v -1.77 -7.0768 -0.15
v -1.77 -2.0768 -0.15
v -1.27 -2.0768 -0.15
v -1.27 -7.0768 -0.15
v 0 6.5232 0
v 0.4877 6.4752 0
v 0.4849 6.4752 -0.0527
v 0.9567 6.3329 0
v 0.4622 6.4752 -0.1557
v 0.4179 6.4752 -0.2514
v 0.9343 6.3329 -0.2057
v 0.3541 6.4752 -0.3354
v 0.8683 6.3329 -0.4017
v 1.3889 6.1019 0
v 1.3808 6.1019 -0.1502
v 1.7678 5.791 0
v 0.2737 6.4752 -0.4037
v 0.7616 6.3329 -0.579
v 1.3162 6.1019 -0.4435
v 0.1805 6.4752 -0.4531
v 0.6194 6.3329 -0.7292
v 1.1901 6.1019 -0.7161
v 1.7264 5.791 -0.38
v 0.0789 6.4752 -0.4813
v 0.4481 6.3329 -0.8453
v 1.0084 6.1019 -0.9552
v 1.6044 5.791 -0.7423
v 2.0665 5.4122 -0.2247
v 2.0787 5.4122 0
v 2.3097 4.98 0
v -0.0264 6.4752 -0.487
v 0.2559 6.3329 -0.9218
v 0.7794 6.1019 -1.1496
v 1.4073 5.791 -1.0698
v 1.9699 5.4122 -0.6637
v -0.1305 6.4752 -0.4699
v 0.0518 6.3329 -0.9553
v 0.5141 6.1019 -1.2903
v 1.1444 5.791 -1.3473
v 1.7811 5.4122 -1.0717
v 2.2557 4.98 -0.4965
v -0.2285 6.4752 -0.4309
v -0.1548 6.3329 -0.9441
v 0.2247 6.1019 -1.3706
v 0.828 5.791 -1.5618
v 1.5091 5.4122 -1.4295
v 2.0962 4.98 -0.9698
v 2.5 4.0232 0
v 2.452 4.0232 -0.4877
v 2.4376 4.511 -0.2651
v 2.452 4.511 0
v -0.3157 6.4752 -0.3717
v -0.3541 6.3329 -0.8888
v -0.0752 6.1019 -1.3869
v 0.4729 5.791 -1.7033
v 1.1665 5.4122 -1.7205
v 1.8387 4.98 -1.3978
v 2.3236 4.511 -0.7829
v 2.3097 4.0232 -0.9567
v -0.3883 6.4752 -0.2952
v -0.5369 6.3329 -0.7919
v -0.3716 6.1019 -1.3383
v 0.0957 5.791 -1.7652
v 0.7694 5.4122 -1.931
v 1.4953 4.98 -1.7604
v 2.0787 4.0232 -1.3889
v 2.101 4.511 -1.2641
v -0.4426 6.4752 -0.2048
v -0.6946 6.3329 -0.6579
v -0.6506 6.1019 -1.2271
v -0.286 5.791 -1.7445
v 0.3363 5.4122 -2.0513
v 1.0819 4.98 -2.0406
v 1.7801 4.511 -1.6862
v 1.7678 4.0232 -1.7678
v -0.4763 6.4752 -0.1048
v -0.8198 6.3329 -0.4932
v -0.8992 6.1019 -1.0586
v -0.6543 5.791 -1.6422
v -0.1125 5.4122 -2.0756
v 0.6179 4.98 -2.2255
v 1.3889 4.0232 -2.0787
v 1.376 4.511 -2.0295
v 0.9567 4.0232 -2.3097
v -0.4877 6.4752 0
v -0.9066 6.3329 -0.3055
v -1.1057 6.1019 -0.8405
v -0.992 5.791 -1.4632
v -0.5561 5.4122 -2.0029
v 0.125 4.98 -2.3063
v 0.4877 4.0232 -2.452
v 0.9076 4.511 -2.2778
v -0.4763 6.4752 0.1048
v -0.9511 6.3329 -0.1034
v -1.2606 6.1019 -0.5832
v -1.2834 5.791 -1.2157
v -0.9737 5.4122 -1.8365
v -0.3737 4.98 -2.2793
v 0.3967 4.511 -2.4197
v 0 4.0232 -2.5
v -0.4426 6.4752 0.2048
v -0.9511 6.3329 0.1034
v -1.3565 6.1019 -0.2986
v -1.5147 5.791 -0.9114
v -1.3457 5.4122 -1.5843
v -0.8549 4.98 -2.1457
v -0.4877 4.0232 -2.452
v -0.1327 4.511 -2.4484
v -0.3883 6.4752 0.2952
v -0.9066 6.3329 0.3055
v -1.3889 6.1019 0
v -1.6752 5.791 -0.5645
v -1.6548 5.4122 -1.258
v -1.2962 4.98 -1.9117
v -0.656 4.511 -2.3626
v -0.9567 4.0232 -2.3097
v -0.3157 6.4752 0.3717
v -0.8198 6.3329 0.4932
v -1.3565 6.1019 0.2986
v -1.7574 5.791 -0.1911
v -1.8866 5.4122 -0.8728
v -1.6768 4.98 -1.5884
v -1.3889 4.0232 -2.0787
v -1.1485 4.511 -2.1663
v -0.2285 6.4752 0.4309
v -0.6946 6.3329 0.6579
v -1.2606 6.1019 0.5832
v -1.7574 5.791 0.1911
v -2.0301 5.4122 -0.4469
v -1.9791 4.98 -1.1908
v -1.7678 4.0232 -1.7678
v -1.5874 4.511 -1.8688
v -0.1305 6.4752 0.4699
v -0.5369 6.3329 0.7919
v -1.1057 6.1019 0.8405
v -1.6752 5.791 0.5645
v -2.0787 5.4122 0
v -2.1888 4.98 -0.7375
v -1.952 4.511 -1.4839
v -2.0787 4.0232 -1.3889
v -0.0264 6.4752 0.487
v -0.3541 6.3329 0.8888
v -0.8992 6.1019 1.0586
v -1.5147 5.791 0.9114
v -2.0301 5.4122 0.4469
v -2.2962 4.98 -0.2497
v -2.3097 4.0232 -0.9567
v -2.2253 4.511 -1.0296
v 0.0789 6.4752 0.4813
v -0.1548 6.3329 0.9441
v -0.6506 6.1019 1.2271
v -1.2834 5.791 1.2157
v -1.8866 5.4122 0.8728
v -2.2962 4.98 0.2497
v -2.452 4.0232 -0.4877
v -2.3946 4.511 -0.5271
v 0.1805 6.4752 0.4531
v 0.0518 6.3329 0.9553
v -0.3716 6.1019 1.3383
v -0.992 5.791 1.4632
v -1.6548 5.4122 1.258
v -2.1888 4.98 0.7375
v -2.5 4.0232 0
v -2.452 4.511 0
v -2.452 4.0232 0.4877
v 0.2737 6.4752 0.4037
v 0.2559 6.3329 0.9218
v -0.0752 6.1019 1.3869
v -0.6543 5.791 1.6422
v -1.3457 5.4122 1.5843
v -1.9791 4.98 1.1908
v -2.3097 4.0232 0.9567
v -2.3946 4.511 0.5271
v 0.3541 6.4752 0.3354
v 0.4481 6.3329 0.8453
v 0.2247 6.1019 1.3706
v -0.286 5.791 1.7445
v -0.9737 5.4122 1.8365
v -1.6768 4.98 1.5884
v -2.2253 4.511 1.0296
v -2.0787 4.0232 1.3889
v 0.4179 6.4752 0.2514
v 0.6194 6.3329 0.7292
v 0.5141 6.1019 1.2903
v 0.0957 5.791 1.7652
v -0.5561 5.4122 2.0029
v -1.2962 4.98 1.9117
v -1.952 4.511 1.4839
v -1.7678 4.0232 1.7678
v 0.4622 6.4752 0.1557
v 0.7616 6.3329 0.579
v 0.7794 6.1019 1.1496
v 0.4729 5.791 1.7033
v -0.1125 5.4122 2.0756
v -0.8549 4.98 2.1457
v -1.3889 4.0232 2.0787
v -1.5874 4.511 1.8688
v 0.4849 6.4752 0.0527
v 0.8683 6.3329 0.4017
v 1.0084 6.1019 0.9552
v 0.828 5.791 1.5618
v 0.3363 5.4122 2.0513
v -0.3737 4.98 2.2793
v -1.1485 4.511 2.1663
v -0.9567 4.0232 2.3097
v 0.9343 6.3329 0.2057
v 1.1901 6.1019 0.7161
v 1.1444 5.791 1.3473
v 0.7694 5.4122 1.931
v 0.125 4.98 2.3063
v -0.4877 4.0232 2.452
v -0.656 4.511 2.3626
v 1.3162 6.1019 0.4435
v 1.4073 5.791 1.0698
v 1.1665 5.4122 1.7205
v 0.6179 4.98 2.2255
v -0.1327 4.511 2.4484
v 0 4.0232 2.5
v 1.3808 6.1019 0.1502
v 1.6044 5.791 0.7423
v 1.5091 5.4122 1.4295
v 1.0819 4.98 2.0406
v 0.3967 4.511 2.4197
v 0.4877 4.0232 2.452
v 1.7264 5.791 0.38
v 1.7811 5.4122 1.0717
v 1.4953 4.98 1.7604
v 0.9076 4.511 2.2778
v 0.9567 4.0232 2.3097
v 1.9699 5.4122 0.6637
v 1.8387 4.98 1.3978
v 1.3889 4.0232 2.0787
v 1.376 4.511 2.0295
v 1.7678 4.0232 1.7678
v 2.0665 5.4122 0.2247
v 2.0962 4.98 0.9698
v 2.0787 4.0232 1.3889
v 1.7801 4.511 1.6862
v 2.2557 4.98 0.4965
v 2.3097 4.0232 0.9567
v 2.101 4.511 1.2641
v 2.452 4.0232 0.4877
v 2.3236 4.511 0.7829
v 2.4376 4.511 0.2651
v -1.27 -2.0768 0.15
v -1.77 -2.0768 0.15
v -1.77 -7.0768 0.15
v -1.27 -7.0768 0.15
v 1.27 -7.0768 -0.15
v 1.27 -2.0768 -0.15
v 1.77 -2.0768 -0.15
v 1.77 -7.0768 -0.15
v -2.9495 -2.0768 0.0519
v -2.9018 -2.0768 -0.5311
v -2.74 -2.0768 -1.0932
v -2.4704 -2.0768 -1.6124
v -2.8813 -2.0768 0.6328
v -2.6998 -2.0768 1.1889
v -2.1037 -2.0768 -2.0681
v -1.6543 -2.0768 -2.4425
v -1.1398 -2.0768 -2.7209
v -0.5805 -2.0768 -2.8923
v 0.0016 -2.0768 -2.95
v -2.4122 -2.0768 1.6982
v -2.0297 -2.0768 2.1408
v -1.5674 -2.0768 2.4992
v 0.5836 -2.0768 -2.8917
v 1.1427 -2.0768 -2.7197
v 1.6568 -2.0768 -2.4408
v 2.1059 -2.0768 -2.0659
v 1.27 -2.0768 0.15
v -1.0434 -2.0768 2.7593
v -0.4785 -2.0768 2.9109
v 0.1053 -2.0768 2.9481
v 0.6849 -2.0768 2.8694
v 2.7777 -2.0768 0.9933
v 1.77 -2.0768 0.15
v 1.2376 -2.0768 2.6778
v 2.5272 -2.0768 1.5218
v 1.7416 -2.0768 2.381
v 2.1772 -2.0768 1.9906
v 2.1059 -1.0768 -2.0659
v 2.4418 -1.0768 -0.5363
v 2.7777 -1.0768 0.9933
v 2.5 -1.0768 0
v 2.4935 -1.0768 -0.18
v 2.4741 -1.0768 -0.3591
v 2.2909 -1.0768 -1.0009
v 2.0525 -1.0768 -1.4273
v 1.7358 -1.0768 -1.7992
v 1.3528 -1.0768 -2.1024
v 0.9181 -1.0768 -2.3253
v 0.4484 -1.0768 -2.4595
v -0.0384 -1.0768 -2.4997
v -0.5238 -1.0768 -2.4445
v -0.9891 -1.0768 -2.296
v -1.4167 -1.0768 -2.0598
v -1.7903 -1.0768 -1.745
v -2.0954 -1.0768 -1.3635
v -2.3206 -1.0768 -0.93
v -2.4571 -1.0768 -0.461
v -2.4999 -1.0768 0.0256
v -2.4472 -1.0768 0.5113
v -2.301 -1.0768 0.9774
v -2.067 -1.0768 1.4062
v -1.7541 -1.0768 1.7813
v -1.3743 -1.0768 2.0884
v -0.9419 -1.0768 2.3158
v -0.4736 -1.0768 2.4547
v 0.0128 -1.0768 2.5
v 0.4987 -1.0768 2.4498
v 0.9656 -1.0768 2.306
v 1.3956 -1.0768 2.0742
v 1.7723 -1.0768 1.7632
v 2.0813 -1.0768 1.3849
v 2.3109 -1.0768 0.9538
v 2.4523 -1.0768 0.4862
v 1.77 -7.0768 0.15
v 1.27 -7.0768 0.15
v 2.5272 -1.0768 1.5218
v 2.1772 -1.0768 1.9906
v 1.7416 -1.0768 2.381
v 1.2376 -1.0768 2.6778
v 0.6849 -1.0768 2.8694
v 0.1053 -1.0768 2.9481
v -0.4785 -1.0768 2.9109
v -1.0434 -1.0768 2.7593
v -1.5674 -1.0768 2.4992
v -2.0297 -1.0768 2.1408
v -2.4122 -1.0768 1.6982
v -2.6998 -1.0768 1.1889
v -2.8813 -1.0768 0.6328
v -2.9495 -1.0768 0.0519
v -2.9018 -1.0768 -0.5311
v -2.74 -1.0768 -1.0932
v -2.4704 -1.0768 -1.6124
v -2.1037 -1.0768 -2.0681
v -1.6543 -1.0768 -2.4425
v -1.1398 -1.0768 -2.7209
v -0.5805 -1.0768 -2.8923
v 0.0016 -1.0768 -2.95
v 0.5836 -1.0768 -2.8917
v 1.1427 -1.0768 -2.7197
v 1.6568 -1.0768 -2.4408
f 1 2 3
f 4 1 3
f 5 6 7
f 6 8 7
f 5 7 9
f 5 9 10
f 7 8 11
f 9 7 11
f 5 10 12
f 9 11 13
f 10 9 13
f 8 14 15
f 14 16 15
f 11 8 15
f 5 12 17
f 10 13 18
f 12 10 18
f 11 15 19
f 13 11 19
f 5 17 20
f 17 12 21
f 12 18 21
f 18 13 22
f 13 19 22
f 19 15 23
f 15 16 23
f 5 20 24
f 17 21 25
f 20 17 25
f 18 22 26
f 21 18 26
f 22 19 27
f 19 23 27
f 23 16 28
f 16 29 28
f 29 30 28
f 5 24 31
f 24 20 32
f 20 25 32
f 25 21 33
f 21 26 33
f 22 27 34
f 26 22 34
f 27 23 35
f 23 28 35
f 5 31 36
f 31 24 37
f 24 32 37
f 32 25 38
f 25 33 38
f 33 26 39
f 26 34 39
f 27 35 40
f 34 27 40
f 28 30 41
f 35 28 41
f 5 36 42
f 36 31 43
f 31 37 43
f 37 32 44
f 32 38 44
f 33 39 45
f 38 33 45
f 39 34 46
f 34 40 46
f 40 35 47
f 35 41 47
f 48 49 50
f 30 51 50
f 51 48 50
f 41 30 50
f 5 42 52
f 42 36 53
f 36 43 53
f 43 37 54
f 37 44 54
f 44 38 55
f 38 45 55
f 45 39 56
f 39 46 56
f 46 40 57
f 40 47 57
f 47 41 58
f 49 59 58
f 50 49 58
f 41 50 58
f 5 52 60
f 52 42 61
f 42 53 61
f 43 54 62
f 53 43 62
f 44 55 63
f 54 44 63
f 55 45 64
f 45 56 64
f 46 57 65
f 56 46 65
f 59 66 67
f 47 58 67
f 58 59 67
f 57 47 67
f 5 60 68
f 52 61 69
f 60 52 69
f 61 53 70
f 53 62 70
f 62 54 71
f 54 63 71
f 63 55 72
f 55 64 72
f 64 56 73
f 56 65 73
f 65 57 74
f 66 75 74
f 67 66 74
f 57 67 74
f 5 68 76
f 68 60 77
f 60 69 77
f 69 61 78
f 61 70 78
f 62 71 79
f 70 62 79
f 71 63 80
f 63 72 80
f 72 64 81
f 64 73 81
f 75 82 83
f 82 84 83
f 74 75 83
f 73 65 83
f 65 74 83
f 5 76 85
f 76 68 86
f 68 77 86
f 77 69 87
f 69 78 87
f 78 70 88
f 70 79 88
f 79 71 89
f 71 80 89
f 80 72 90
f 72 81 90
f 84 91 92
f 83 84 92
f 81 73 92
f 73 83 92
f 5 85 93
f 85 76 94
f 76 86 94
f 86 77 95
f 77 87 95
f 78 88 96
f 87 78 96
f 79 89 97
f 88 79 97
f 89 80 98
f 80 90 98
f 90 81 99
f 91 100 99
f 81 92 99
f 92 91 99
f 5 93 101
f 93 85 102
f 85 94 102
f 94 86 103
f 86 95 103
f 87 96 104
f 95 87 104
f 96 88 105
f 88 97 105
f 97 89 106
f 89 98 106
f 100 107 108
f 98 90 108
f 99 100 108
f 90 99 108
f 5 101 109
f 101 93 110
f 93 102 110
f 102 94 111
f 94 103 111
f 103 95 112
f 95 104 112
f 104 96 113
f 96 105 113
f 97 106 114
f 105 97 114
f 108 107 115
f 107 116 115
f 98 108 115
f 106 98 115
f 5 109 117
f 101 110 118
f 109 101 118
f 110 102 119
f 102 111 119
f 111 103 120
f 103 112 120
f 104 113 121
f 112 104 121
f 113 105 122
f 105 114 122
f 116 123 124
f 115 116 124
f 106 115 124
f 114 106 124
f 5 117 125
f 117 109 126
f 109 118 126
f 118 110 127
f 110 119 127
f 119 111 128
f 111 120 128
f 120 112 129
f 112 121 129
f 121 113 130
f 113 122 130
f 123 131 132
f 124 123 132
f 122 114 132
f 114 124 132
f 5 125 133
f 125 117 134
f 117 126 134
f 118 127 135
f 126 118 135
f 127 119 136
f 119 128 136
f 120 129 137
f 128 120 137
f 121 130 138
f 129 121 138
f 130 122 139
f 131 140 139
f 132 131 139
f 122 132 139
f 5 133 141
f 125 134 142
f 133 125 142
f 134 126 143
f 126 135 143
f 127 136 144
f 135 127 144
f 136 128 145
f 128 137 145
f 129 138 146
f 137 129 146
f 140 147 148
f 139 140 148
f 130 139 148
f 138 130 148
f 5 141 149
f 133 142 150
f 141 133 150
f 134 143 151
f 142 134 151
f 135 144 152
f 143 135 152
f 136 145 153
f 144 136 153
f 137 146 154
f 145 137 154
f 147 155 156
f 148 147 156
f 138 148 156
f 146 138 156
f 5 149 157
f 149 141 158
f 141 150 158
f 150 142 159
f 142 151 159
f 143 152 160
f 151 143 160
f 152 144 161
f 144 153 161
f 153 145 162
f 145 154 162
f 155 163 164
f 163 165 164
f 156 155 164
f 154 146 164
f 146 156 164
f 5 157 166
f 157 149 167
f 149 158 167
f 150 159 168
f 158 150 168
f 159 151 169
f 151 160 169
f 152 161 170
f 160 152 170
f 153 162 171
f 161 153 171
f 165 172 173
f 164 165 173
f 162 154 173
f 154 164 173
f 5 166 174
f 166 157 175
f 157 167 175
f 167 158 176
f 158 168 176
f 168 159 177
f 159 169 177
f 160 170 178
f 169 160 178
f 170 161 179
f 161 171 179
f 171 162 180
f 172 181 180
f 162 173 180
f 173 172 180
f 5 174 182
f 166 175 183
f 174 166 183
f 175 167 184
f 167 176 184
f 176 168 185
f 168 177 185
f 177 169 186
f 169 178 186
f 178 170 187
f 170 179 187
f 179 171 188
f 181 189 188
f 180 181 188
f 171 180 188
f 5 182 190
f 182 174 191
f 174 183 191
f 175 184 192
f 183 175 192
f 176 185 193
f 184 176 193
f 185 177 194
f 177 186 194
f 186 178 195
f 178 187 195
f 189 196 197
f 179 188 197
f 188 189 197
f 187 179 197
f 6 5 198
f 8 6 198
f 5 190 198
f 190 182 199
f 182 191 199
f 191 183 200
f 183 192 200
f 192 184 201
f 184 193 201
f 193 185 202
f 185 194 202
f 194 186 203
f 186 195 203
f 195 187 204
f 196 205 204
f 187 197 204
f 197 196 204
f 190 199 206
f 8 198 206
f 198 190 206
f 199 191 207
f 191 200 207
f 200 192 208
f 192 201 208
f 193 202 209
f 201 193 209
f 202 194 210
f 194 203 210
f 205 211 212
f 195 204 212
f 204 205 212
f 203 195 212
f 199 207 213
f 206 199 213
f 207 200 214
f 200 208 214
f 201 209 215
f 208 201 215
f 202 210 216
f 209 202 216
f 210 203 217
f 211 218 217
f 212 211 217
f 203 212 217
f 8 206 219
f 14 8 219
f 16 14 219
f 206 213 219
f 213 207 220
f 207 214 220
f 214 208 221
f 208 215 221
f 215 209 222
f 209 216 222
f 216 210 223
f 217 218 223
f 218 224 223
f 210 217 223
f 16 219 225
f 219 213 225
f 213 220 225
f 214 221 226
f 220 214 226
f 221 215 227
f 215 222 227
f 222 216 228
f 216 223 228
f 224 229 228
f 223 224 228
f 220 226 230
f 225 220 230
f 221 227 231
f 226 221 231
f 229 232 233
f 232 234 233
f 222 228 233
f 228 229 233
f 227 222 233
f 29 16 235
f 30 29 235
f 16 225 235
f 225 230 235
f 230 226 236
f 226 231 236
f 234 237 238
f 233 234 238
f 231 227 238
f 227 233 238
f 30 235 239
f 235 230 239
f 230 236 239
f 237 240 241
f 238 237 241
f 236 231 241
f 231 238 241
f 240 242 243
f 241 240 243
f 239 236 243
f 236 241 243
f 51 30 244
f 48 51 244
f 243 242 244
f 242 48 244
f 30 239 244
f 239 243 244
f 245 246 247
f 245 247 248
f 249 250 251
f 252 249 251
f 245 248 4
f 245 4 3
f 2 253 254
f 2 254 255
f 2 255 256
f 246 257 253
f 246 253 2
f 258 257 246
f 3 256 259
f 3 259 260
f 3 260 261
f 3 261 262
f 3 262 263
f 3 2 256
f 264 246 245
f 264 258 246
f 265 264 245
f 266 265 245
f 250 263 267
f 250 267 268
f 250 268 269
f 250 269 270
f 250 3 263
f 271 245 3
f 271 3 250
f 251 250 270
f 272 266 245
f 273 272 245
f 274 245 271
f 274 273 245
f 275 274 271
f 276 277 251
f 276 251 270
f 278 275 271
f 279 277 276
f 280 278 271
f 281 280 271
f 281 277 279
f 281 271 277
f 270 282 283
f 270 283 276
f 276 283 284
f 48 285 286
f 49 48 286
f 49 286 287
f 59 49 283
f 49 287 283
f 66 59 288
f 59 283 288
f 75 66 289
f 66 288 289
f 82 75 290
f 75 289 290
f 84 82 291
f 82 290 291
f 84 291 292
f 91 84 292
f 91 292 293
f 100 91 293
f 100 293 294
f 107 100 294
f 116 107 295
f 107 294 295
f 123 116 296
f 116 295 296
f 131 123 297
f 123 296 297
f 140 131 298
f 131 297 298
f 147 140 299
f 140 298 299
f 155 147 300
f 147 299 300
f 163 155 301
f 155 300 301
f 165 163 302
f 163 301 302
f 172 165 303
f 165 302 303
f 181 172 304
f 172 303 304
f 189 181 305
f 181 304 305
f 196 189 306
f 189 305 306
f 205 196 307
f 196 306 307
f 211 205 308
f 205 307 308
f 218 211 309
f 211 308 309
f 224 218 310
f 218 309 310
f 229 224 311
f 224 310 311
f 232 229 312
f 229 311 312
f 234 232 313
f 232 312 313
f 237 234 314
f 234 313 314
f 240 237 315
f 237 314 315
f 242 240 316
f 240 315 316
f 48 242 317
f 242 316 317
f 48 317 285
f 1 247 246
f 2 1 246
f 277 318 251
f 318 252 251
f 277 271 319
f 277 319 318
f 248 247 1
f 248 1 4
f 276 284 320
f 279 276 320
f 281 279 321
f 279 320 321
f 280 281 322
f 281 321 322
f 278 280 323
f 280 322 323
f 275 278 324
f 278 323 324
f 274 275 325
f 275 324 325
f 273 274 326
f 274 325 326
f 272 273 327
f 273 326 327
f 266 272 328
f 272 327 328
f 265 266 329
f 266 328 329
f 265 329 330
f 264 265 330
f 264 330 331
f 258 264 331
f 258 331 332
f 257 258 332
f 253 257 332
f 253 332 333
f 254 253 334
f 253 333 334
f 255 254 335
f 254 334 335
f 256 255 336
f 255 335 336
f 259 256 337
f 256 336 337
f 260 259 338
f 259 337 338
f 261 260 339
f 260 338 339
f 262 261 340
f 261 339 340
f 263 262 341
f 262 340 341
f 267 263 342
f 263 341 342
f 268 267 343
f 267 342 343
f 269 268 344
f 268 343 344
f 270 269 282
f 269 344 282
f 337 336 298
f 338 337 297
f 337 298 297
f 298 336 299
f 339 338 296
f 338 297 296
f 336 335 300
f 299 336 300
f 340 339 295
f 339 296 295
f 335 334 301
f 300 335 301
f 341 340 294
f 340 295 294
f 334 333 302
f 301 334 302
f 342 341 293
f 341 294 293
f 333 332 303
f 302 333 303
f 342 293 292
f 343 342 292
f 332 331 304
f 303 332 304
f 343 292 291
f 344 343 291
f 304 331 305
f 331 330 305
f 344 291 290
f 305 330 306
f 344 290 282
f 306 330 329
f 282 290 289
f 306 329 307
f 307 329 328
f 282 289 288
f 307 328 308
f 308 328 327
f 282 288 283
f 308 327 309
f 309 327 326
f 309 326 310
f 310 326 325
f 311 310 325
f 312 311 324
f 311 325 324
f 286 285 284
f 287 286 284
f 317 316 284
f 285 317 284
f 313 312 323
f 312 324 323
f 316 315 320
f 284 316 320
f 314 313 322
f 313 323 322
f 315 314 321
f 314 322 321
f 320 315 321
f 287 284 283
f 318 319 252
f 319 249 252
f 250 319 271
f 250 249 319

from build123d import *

# Parameters (mm, degrees)
BOSS_EXTRUDE1_DEPTH = 1
SKETCH4_W           = 0.5
SKETCH4_H           = 5
BOSS_EXTRUDE2_DEPTH = 0.15


with BuildPart() as part:
    # Sketch1 → Revolve1 (revolve)
    with BuildSketch(Plane.XY):
        with BuildLine():
            Line((2.5, 4.02324589), (2.5, -1.07675411))
            Line((2.5, -1.07675411), (0, -1.07675411))
            Line((0, -1.07675411), (0, 6.52324589))
            ThreePointArc((0, 6.52324589), (1.767766953, 5.791012843), (2.5, 4.02324589))
        make_face()
    revolve(axis=Axis((0, -170.01390881, 0), (0, 1, 0)))

    # Sketch2 → Boss-Extrude1 (add)
    with BuildSketch(Plane.XZ.offset(1.07675411)):
        with BuildLine():
            Line((2.10585574, -2.065882766), (2.777744802, 0.993294426))
            ThreePointArc((2.777744802, 0.993294426), (-2.88132432, 0.632827121), (2.10585574, -2.065882766))
        make_face()
    extrude(amount=BOSS_EXTRUDE1_DEPTH)

    # Sketch4 → Boss-Extrude2 (add, symmetric)
    with BuildSketch(Plane.XY):
        with Locations((1.52, -4.57675411)):
            Rectangle(SKETCH4_W, SKETCH4_H)
        with Locations((-1.52, -4.57675411)):
            Rectangle(SKETCH4_W, SKETCH4_H)
    extrude(amount=BOSS_EXTRUDE2_DEPTH, both=True)


solid = part.part
